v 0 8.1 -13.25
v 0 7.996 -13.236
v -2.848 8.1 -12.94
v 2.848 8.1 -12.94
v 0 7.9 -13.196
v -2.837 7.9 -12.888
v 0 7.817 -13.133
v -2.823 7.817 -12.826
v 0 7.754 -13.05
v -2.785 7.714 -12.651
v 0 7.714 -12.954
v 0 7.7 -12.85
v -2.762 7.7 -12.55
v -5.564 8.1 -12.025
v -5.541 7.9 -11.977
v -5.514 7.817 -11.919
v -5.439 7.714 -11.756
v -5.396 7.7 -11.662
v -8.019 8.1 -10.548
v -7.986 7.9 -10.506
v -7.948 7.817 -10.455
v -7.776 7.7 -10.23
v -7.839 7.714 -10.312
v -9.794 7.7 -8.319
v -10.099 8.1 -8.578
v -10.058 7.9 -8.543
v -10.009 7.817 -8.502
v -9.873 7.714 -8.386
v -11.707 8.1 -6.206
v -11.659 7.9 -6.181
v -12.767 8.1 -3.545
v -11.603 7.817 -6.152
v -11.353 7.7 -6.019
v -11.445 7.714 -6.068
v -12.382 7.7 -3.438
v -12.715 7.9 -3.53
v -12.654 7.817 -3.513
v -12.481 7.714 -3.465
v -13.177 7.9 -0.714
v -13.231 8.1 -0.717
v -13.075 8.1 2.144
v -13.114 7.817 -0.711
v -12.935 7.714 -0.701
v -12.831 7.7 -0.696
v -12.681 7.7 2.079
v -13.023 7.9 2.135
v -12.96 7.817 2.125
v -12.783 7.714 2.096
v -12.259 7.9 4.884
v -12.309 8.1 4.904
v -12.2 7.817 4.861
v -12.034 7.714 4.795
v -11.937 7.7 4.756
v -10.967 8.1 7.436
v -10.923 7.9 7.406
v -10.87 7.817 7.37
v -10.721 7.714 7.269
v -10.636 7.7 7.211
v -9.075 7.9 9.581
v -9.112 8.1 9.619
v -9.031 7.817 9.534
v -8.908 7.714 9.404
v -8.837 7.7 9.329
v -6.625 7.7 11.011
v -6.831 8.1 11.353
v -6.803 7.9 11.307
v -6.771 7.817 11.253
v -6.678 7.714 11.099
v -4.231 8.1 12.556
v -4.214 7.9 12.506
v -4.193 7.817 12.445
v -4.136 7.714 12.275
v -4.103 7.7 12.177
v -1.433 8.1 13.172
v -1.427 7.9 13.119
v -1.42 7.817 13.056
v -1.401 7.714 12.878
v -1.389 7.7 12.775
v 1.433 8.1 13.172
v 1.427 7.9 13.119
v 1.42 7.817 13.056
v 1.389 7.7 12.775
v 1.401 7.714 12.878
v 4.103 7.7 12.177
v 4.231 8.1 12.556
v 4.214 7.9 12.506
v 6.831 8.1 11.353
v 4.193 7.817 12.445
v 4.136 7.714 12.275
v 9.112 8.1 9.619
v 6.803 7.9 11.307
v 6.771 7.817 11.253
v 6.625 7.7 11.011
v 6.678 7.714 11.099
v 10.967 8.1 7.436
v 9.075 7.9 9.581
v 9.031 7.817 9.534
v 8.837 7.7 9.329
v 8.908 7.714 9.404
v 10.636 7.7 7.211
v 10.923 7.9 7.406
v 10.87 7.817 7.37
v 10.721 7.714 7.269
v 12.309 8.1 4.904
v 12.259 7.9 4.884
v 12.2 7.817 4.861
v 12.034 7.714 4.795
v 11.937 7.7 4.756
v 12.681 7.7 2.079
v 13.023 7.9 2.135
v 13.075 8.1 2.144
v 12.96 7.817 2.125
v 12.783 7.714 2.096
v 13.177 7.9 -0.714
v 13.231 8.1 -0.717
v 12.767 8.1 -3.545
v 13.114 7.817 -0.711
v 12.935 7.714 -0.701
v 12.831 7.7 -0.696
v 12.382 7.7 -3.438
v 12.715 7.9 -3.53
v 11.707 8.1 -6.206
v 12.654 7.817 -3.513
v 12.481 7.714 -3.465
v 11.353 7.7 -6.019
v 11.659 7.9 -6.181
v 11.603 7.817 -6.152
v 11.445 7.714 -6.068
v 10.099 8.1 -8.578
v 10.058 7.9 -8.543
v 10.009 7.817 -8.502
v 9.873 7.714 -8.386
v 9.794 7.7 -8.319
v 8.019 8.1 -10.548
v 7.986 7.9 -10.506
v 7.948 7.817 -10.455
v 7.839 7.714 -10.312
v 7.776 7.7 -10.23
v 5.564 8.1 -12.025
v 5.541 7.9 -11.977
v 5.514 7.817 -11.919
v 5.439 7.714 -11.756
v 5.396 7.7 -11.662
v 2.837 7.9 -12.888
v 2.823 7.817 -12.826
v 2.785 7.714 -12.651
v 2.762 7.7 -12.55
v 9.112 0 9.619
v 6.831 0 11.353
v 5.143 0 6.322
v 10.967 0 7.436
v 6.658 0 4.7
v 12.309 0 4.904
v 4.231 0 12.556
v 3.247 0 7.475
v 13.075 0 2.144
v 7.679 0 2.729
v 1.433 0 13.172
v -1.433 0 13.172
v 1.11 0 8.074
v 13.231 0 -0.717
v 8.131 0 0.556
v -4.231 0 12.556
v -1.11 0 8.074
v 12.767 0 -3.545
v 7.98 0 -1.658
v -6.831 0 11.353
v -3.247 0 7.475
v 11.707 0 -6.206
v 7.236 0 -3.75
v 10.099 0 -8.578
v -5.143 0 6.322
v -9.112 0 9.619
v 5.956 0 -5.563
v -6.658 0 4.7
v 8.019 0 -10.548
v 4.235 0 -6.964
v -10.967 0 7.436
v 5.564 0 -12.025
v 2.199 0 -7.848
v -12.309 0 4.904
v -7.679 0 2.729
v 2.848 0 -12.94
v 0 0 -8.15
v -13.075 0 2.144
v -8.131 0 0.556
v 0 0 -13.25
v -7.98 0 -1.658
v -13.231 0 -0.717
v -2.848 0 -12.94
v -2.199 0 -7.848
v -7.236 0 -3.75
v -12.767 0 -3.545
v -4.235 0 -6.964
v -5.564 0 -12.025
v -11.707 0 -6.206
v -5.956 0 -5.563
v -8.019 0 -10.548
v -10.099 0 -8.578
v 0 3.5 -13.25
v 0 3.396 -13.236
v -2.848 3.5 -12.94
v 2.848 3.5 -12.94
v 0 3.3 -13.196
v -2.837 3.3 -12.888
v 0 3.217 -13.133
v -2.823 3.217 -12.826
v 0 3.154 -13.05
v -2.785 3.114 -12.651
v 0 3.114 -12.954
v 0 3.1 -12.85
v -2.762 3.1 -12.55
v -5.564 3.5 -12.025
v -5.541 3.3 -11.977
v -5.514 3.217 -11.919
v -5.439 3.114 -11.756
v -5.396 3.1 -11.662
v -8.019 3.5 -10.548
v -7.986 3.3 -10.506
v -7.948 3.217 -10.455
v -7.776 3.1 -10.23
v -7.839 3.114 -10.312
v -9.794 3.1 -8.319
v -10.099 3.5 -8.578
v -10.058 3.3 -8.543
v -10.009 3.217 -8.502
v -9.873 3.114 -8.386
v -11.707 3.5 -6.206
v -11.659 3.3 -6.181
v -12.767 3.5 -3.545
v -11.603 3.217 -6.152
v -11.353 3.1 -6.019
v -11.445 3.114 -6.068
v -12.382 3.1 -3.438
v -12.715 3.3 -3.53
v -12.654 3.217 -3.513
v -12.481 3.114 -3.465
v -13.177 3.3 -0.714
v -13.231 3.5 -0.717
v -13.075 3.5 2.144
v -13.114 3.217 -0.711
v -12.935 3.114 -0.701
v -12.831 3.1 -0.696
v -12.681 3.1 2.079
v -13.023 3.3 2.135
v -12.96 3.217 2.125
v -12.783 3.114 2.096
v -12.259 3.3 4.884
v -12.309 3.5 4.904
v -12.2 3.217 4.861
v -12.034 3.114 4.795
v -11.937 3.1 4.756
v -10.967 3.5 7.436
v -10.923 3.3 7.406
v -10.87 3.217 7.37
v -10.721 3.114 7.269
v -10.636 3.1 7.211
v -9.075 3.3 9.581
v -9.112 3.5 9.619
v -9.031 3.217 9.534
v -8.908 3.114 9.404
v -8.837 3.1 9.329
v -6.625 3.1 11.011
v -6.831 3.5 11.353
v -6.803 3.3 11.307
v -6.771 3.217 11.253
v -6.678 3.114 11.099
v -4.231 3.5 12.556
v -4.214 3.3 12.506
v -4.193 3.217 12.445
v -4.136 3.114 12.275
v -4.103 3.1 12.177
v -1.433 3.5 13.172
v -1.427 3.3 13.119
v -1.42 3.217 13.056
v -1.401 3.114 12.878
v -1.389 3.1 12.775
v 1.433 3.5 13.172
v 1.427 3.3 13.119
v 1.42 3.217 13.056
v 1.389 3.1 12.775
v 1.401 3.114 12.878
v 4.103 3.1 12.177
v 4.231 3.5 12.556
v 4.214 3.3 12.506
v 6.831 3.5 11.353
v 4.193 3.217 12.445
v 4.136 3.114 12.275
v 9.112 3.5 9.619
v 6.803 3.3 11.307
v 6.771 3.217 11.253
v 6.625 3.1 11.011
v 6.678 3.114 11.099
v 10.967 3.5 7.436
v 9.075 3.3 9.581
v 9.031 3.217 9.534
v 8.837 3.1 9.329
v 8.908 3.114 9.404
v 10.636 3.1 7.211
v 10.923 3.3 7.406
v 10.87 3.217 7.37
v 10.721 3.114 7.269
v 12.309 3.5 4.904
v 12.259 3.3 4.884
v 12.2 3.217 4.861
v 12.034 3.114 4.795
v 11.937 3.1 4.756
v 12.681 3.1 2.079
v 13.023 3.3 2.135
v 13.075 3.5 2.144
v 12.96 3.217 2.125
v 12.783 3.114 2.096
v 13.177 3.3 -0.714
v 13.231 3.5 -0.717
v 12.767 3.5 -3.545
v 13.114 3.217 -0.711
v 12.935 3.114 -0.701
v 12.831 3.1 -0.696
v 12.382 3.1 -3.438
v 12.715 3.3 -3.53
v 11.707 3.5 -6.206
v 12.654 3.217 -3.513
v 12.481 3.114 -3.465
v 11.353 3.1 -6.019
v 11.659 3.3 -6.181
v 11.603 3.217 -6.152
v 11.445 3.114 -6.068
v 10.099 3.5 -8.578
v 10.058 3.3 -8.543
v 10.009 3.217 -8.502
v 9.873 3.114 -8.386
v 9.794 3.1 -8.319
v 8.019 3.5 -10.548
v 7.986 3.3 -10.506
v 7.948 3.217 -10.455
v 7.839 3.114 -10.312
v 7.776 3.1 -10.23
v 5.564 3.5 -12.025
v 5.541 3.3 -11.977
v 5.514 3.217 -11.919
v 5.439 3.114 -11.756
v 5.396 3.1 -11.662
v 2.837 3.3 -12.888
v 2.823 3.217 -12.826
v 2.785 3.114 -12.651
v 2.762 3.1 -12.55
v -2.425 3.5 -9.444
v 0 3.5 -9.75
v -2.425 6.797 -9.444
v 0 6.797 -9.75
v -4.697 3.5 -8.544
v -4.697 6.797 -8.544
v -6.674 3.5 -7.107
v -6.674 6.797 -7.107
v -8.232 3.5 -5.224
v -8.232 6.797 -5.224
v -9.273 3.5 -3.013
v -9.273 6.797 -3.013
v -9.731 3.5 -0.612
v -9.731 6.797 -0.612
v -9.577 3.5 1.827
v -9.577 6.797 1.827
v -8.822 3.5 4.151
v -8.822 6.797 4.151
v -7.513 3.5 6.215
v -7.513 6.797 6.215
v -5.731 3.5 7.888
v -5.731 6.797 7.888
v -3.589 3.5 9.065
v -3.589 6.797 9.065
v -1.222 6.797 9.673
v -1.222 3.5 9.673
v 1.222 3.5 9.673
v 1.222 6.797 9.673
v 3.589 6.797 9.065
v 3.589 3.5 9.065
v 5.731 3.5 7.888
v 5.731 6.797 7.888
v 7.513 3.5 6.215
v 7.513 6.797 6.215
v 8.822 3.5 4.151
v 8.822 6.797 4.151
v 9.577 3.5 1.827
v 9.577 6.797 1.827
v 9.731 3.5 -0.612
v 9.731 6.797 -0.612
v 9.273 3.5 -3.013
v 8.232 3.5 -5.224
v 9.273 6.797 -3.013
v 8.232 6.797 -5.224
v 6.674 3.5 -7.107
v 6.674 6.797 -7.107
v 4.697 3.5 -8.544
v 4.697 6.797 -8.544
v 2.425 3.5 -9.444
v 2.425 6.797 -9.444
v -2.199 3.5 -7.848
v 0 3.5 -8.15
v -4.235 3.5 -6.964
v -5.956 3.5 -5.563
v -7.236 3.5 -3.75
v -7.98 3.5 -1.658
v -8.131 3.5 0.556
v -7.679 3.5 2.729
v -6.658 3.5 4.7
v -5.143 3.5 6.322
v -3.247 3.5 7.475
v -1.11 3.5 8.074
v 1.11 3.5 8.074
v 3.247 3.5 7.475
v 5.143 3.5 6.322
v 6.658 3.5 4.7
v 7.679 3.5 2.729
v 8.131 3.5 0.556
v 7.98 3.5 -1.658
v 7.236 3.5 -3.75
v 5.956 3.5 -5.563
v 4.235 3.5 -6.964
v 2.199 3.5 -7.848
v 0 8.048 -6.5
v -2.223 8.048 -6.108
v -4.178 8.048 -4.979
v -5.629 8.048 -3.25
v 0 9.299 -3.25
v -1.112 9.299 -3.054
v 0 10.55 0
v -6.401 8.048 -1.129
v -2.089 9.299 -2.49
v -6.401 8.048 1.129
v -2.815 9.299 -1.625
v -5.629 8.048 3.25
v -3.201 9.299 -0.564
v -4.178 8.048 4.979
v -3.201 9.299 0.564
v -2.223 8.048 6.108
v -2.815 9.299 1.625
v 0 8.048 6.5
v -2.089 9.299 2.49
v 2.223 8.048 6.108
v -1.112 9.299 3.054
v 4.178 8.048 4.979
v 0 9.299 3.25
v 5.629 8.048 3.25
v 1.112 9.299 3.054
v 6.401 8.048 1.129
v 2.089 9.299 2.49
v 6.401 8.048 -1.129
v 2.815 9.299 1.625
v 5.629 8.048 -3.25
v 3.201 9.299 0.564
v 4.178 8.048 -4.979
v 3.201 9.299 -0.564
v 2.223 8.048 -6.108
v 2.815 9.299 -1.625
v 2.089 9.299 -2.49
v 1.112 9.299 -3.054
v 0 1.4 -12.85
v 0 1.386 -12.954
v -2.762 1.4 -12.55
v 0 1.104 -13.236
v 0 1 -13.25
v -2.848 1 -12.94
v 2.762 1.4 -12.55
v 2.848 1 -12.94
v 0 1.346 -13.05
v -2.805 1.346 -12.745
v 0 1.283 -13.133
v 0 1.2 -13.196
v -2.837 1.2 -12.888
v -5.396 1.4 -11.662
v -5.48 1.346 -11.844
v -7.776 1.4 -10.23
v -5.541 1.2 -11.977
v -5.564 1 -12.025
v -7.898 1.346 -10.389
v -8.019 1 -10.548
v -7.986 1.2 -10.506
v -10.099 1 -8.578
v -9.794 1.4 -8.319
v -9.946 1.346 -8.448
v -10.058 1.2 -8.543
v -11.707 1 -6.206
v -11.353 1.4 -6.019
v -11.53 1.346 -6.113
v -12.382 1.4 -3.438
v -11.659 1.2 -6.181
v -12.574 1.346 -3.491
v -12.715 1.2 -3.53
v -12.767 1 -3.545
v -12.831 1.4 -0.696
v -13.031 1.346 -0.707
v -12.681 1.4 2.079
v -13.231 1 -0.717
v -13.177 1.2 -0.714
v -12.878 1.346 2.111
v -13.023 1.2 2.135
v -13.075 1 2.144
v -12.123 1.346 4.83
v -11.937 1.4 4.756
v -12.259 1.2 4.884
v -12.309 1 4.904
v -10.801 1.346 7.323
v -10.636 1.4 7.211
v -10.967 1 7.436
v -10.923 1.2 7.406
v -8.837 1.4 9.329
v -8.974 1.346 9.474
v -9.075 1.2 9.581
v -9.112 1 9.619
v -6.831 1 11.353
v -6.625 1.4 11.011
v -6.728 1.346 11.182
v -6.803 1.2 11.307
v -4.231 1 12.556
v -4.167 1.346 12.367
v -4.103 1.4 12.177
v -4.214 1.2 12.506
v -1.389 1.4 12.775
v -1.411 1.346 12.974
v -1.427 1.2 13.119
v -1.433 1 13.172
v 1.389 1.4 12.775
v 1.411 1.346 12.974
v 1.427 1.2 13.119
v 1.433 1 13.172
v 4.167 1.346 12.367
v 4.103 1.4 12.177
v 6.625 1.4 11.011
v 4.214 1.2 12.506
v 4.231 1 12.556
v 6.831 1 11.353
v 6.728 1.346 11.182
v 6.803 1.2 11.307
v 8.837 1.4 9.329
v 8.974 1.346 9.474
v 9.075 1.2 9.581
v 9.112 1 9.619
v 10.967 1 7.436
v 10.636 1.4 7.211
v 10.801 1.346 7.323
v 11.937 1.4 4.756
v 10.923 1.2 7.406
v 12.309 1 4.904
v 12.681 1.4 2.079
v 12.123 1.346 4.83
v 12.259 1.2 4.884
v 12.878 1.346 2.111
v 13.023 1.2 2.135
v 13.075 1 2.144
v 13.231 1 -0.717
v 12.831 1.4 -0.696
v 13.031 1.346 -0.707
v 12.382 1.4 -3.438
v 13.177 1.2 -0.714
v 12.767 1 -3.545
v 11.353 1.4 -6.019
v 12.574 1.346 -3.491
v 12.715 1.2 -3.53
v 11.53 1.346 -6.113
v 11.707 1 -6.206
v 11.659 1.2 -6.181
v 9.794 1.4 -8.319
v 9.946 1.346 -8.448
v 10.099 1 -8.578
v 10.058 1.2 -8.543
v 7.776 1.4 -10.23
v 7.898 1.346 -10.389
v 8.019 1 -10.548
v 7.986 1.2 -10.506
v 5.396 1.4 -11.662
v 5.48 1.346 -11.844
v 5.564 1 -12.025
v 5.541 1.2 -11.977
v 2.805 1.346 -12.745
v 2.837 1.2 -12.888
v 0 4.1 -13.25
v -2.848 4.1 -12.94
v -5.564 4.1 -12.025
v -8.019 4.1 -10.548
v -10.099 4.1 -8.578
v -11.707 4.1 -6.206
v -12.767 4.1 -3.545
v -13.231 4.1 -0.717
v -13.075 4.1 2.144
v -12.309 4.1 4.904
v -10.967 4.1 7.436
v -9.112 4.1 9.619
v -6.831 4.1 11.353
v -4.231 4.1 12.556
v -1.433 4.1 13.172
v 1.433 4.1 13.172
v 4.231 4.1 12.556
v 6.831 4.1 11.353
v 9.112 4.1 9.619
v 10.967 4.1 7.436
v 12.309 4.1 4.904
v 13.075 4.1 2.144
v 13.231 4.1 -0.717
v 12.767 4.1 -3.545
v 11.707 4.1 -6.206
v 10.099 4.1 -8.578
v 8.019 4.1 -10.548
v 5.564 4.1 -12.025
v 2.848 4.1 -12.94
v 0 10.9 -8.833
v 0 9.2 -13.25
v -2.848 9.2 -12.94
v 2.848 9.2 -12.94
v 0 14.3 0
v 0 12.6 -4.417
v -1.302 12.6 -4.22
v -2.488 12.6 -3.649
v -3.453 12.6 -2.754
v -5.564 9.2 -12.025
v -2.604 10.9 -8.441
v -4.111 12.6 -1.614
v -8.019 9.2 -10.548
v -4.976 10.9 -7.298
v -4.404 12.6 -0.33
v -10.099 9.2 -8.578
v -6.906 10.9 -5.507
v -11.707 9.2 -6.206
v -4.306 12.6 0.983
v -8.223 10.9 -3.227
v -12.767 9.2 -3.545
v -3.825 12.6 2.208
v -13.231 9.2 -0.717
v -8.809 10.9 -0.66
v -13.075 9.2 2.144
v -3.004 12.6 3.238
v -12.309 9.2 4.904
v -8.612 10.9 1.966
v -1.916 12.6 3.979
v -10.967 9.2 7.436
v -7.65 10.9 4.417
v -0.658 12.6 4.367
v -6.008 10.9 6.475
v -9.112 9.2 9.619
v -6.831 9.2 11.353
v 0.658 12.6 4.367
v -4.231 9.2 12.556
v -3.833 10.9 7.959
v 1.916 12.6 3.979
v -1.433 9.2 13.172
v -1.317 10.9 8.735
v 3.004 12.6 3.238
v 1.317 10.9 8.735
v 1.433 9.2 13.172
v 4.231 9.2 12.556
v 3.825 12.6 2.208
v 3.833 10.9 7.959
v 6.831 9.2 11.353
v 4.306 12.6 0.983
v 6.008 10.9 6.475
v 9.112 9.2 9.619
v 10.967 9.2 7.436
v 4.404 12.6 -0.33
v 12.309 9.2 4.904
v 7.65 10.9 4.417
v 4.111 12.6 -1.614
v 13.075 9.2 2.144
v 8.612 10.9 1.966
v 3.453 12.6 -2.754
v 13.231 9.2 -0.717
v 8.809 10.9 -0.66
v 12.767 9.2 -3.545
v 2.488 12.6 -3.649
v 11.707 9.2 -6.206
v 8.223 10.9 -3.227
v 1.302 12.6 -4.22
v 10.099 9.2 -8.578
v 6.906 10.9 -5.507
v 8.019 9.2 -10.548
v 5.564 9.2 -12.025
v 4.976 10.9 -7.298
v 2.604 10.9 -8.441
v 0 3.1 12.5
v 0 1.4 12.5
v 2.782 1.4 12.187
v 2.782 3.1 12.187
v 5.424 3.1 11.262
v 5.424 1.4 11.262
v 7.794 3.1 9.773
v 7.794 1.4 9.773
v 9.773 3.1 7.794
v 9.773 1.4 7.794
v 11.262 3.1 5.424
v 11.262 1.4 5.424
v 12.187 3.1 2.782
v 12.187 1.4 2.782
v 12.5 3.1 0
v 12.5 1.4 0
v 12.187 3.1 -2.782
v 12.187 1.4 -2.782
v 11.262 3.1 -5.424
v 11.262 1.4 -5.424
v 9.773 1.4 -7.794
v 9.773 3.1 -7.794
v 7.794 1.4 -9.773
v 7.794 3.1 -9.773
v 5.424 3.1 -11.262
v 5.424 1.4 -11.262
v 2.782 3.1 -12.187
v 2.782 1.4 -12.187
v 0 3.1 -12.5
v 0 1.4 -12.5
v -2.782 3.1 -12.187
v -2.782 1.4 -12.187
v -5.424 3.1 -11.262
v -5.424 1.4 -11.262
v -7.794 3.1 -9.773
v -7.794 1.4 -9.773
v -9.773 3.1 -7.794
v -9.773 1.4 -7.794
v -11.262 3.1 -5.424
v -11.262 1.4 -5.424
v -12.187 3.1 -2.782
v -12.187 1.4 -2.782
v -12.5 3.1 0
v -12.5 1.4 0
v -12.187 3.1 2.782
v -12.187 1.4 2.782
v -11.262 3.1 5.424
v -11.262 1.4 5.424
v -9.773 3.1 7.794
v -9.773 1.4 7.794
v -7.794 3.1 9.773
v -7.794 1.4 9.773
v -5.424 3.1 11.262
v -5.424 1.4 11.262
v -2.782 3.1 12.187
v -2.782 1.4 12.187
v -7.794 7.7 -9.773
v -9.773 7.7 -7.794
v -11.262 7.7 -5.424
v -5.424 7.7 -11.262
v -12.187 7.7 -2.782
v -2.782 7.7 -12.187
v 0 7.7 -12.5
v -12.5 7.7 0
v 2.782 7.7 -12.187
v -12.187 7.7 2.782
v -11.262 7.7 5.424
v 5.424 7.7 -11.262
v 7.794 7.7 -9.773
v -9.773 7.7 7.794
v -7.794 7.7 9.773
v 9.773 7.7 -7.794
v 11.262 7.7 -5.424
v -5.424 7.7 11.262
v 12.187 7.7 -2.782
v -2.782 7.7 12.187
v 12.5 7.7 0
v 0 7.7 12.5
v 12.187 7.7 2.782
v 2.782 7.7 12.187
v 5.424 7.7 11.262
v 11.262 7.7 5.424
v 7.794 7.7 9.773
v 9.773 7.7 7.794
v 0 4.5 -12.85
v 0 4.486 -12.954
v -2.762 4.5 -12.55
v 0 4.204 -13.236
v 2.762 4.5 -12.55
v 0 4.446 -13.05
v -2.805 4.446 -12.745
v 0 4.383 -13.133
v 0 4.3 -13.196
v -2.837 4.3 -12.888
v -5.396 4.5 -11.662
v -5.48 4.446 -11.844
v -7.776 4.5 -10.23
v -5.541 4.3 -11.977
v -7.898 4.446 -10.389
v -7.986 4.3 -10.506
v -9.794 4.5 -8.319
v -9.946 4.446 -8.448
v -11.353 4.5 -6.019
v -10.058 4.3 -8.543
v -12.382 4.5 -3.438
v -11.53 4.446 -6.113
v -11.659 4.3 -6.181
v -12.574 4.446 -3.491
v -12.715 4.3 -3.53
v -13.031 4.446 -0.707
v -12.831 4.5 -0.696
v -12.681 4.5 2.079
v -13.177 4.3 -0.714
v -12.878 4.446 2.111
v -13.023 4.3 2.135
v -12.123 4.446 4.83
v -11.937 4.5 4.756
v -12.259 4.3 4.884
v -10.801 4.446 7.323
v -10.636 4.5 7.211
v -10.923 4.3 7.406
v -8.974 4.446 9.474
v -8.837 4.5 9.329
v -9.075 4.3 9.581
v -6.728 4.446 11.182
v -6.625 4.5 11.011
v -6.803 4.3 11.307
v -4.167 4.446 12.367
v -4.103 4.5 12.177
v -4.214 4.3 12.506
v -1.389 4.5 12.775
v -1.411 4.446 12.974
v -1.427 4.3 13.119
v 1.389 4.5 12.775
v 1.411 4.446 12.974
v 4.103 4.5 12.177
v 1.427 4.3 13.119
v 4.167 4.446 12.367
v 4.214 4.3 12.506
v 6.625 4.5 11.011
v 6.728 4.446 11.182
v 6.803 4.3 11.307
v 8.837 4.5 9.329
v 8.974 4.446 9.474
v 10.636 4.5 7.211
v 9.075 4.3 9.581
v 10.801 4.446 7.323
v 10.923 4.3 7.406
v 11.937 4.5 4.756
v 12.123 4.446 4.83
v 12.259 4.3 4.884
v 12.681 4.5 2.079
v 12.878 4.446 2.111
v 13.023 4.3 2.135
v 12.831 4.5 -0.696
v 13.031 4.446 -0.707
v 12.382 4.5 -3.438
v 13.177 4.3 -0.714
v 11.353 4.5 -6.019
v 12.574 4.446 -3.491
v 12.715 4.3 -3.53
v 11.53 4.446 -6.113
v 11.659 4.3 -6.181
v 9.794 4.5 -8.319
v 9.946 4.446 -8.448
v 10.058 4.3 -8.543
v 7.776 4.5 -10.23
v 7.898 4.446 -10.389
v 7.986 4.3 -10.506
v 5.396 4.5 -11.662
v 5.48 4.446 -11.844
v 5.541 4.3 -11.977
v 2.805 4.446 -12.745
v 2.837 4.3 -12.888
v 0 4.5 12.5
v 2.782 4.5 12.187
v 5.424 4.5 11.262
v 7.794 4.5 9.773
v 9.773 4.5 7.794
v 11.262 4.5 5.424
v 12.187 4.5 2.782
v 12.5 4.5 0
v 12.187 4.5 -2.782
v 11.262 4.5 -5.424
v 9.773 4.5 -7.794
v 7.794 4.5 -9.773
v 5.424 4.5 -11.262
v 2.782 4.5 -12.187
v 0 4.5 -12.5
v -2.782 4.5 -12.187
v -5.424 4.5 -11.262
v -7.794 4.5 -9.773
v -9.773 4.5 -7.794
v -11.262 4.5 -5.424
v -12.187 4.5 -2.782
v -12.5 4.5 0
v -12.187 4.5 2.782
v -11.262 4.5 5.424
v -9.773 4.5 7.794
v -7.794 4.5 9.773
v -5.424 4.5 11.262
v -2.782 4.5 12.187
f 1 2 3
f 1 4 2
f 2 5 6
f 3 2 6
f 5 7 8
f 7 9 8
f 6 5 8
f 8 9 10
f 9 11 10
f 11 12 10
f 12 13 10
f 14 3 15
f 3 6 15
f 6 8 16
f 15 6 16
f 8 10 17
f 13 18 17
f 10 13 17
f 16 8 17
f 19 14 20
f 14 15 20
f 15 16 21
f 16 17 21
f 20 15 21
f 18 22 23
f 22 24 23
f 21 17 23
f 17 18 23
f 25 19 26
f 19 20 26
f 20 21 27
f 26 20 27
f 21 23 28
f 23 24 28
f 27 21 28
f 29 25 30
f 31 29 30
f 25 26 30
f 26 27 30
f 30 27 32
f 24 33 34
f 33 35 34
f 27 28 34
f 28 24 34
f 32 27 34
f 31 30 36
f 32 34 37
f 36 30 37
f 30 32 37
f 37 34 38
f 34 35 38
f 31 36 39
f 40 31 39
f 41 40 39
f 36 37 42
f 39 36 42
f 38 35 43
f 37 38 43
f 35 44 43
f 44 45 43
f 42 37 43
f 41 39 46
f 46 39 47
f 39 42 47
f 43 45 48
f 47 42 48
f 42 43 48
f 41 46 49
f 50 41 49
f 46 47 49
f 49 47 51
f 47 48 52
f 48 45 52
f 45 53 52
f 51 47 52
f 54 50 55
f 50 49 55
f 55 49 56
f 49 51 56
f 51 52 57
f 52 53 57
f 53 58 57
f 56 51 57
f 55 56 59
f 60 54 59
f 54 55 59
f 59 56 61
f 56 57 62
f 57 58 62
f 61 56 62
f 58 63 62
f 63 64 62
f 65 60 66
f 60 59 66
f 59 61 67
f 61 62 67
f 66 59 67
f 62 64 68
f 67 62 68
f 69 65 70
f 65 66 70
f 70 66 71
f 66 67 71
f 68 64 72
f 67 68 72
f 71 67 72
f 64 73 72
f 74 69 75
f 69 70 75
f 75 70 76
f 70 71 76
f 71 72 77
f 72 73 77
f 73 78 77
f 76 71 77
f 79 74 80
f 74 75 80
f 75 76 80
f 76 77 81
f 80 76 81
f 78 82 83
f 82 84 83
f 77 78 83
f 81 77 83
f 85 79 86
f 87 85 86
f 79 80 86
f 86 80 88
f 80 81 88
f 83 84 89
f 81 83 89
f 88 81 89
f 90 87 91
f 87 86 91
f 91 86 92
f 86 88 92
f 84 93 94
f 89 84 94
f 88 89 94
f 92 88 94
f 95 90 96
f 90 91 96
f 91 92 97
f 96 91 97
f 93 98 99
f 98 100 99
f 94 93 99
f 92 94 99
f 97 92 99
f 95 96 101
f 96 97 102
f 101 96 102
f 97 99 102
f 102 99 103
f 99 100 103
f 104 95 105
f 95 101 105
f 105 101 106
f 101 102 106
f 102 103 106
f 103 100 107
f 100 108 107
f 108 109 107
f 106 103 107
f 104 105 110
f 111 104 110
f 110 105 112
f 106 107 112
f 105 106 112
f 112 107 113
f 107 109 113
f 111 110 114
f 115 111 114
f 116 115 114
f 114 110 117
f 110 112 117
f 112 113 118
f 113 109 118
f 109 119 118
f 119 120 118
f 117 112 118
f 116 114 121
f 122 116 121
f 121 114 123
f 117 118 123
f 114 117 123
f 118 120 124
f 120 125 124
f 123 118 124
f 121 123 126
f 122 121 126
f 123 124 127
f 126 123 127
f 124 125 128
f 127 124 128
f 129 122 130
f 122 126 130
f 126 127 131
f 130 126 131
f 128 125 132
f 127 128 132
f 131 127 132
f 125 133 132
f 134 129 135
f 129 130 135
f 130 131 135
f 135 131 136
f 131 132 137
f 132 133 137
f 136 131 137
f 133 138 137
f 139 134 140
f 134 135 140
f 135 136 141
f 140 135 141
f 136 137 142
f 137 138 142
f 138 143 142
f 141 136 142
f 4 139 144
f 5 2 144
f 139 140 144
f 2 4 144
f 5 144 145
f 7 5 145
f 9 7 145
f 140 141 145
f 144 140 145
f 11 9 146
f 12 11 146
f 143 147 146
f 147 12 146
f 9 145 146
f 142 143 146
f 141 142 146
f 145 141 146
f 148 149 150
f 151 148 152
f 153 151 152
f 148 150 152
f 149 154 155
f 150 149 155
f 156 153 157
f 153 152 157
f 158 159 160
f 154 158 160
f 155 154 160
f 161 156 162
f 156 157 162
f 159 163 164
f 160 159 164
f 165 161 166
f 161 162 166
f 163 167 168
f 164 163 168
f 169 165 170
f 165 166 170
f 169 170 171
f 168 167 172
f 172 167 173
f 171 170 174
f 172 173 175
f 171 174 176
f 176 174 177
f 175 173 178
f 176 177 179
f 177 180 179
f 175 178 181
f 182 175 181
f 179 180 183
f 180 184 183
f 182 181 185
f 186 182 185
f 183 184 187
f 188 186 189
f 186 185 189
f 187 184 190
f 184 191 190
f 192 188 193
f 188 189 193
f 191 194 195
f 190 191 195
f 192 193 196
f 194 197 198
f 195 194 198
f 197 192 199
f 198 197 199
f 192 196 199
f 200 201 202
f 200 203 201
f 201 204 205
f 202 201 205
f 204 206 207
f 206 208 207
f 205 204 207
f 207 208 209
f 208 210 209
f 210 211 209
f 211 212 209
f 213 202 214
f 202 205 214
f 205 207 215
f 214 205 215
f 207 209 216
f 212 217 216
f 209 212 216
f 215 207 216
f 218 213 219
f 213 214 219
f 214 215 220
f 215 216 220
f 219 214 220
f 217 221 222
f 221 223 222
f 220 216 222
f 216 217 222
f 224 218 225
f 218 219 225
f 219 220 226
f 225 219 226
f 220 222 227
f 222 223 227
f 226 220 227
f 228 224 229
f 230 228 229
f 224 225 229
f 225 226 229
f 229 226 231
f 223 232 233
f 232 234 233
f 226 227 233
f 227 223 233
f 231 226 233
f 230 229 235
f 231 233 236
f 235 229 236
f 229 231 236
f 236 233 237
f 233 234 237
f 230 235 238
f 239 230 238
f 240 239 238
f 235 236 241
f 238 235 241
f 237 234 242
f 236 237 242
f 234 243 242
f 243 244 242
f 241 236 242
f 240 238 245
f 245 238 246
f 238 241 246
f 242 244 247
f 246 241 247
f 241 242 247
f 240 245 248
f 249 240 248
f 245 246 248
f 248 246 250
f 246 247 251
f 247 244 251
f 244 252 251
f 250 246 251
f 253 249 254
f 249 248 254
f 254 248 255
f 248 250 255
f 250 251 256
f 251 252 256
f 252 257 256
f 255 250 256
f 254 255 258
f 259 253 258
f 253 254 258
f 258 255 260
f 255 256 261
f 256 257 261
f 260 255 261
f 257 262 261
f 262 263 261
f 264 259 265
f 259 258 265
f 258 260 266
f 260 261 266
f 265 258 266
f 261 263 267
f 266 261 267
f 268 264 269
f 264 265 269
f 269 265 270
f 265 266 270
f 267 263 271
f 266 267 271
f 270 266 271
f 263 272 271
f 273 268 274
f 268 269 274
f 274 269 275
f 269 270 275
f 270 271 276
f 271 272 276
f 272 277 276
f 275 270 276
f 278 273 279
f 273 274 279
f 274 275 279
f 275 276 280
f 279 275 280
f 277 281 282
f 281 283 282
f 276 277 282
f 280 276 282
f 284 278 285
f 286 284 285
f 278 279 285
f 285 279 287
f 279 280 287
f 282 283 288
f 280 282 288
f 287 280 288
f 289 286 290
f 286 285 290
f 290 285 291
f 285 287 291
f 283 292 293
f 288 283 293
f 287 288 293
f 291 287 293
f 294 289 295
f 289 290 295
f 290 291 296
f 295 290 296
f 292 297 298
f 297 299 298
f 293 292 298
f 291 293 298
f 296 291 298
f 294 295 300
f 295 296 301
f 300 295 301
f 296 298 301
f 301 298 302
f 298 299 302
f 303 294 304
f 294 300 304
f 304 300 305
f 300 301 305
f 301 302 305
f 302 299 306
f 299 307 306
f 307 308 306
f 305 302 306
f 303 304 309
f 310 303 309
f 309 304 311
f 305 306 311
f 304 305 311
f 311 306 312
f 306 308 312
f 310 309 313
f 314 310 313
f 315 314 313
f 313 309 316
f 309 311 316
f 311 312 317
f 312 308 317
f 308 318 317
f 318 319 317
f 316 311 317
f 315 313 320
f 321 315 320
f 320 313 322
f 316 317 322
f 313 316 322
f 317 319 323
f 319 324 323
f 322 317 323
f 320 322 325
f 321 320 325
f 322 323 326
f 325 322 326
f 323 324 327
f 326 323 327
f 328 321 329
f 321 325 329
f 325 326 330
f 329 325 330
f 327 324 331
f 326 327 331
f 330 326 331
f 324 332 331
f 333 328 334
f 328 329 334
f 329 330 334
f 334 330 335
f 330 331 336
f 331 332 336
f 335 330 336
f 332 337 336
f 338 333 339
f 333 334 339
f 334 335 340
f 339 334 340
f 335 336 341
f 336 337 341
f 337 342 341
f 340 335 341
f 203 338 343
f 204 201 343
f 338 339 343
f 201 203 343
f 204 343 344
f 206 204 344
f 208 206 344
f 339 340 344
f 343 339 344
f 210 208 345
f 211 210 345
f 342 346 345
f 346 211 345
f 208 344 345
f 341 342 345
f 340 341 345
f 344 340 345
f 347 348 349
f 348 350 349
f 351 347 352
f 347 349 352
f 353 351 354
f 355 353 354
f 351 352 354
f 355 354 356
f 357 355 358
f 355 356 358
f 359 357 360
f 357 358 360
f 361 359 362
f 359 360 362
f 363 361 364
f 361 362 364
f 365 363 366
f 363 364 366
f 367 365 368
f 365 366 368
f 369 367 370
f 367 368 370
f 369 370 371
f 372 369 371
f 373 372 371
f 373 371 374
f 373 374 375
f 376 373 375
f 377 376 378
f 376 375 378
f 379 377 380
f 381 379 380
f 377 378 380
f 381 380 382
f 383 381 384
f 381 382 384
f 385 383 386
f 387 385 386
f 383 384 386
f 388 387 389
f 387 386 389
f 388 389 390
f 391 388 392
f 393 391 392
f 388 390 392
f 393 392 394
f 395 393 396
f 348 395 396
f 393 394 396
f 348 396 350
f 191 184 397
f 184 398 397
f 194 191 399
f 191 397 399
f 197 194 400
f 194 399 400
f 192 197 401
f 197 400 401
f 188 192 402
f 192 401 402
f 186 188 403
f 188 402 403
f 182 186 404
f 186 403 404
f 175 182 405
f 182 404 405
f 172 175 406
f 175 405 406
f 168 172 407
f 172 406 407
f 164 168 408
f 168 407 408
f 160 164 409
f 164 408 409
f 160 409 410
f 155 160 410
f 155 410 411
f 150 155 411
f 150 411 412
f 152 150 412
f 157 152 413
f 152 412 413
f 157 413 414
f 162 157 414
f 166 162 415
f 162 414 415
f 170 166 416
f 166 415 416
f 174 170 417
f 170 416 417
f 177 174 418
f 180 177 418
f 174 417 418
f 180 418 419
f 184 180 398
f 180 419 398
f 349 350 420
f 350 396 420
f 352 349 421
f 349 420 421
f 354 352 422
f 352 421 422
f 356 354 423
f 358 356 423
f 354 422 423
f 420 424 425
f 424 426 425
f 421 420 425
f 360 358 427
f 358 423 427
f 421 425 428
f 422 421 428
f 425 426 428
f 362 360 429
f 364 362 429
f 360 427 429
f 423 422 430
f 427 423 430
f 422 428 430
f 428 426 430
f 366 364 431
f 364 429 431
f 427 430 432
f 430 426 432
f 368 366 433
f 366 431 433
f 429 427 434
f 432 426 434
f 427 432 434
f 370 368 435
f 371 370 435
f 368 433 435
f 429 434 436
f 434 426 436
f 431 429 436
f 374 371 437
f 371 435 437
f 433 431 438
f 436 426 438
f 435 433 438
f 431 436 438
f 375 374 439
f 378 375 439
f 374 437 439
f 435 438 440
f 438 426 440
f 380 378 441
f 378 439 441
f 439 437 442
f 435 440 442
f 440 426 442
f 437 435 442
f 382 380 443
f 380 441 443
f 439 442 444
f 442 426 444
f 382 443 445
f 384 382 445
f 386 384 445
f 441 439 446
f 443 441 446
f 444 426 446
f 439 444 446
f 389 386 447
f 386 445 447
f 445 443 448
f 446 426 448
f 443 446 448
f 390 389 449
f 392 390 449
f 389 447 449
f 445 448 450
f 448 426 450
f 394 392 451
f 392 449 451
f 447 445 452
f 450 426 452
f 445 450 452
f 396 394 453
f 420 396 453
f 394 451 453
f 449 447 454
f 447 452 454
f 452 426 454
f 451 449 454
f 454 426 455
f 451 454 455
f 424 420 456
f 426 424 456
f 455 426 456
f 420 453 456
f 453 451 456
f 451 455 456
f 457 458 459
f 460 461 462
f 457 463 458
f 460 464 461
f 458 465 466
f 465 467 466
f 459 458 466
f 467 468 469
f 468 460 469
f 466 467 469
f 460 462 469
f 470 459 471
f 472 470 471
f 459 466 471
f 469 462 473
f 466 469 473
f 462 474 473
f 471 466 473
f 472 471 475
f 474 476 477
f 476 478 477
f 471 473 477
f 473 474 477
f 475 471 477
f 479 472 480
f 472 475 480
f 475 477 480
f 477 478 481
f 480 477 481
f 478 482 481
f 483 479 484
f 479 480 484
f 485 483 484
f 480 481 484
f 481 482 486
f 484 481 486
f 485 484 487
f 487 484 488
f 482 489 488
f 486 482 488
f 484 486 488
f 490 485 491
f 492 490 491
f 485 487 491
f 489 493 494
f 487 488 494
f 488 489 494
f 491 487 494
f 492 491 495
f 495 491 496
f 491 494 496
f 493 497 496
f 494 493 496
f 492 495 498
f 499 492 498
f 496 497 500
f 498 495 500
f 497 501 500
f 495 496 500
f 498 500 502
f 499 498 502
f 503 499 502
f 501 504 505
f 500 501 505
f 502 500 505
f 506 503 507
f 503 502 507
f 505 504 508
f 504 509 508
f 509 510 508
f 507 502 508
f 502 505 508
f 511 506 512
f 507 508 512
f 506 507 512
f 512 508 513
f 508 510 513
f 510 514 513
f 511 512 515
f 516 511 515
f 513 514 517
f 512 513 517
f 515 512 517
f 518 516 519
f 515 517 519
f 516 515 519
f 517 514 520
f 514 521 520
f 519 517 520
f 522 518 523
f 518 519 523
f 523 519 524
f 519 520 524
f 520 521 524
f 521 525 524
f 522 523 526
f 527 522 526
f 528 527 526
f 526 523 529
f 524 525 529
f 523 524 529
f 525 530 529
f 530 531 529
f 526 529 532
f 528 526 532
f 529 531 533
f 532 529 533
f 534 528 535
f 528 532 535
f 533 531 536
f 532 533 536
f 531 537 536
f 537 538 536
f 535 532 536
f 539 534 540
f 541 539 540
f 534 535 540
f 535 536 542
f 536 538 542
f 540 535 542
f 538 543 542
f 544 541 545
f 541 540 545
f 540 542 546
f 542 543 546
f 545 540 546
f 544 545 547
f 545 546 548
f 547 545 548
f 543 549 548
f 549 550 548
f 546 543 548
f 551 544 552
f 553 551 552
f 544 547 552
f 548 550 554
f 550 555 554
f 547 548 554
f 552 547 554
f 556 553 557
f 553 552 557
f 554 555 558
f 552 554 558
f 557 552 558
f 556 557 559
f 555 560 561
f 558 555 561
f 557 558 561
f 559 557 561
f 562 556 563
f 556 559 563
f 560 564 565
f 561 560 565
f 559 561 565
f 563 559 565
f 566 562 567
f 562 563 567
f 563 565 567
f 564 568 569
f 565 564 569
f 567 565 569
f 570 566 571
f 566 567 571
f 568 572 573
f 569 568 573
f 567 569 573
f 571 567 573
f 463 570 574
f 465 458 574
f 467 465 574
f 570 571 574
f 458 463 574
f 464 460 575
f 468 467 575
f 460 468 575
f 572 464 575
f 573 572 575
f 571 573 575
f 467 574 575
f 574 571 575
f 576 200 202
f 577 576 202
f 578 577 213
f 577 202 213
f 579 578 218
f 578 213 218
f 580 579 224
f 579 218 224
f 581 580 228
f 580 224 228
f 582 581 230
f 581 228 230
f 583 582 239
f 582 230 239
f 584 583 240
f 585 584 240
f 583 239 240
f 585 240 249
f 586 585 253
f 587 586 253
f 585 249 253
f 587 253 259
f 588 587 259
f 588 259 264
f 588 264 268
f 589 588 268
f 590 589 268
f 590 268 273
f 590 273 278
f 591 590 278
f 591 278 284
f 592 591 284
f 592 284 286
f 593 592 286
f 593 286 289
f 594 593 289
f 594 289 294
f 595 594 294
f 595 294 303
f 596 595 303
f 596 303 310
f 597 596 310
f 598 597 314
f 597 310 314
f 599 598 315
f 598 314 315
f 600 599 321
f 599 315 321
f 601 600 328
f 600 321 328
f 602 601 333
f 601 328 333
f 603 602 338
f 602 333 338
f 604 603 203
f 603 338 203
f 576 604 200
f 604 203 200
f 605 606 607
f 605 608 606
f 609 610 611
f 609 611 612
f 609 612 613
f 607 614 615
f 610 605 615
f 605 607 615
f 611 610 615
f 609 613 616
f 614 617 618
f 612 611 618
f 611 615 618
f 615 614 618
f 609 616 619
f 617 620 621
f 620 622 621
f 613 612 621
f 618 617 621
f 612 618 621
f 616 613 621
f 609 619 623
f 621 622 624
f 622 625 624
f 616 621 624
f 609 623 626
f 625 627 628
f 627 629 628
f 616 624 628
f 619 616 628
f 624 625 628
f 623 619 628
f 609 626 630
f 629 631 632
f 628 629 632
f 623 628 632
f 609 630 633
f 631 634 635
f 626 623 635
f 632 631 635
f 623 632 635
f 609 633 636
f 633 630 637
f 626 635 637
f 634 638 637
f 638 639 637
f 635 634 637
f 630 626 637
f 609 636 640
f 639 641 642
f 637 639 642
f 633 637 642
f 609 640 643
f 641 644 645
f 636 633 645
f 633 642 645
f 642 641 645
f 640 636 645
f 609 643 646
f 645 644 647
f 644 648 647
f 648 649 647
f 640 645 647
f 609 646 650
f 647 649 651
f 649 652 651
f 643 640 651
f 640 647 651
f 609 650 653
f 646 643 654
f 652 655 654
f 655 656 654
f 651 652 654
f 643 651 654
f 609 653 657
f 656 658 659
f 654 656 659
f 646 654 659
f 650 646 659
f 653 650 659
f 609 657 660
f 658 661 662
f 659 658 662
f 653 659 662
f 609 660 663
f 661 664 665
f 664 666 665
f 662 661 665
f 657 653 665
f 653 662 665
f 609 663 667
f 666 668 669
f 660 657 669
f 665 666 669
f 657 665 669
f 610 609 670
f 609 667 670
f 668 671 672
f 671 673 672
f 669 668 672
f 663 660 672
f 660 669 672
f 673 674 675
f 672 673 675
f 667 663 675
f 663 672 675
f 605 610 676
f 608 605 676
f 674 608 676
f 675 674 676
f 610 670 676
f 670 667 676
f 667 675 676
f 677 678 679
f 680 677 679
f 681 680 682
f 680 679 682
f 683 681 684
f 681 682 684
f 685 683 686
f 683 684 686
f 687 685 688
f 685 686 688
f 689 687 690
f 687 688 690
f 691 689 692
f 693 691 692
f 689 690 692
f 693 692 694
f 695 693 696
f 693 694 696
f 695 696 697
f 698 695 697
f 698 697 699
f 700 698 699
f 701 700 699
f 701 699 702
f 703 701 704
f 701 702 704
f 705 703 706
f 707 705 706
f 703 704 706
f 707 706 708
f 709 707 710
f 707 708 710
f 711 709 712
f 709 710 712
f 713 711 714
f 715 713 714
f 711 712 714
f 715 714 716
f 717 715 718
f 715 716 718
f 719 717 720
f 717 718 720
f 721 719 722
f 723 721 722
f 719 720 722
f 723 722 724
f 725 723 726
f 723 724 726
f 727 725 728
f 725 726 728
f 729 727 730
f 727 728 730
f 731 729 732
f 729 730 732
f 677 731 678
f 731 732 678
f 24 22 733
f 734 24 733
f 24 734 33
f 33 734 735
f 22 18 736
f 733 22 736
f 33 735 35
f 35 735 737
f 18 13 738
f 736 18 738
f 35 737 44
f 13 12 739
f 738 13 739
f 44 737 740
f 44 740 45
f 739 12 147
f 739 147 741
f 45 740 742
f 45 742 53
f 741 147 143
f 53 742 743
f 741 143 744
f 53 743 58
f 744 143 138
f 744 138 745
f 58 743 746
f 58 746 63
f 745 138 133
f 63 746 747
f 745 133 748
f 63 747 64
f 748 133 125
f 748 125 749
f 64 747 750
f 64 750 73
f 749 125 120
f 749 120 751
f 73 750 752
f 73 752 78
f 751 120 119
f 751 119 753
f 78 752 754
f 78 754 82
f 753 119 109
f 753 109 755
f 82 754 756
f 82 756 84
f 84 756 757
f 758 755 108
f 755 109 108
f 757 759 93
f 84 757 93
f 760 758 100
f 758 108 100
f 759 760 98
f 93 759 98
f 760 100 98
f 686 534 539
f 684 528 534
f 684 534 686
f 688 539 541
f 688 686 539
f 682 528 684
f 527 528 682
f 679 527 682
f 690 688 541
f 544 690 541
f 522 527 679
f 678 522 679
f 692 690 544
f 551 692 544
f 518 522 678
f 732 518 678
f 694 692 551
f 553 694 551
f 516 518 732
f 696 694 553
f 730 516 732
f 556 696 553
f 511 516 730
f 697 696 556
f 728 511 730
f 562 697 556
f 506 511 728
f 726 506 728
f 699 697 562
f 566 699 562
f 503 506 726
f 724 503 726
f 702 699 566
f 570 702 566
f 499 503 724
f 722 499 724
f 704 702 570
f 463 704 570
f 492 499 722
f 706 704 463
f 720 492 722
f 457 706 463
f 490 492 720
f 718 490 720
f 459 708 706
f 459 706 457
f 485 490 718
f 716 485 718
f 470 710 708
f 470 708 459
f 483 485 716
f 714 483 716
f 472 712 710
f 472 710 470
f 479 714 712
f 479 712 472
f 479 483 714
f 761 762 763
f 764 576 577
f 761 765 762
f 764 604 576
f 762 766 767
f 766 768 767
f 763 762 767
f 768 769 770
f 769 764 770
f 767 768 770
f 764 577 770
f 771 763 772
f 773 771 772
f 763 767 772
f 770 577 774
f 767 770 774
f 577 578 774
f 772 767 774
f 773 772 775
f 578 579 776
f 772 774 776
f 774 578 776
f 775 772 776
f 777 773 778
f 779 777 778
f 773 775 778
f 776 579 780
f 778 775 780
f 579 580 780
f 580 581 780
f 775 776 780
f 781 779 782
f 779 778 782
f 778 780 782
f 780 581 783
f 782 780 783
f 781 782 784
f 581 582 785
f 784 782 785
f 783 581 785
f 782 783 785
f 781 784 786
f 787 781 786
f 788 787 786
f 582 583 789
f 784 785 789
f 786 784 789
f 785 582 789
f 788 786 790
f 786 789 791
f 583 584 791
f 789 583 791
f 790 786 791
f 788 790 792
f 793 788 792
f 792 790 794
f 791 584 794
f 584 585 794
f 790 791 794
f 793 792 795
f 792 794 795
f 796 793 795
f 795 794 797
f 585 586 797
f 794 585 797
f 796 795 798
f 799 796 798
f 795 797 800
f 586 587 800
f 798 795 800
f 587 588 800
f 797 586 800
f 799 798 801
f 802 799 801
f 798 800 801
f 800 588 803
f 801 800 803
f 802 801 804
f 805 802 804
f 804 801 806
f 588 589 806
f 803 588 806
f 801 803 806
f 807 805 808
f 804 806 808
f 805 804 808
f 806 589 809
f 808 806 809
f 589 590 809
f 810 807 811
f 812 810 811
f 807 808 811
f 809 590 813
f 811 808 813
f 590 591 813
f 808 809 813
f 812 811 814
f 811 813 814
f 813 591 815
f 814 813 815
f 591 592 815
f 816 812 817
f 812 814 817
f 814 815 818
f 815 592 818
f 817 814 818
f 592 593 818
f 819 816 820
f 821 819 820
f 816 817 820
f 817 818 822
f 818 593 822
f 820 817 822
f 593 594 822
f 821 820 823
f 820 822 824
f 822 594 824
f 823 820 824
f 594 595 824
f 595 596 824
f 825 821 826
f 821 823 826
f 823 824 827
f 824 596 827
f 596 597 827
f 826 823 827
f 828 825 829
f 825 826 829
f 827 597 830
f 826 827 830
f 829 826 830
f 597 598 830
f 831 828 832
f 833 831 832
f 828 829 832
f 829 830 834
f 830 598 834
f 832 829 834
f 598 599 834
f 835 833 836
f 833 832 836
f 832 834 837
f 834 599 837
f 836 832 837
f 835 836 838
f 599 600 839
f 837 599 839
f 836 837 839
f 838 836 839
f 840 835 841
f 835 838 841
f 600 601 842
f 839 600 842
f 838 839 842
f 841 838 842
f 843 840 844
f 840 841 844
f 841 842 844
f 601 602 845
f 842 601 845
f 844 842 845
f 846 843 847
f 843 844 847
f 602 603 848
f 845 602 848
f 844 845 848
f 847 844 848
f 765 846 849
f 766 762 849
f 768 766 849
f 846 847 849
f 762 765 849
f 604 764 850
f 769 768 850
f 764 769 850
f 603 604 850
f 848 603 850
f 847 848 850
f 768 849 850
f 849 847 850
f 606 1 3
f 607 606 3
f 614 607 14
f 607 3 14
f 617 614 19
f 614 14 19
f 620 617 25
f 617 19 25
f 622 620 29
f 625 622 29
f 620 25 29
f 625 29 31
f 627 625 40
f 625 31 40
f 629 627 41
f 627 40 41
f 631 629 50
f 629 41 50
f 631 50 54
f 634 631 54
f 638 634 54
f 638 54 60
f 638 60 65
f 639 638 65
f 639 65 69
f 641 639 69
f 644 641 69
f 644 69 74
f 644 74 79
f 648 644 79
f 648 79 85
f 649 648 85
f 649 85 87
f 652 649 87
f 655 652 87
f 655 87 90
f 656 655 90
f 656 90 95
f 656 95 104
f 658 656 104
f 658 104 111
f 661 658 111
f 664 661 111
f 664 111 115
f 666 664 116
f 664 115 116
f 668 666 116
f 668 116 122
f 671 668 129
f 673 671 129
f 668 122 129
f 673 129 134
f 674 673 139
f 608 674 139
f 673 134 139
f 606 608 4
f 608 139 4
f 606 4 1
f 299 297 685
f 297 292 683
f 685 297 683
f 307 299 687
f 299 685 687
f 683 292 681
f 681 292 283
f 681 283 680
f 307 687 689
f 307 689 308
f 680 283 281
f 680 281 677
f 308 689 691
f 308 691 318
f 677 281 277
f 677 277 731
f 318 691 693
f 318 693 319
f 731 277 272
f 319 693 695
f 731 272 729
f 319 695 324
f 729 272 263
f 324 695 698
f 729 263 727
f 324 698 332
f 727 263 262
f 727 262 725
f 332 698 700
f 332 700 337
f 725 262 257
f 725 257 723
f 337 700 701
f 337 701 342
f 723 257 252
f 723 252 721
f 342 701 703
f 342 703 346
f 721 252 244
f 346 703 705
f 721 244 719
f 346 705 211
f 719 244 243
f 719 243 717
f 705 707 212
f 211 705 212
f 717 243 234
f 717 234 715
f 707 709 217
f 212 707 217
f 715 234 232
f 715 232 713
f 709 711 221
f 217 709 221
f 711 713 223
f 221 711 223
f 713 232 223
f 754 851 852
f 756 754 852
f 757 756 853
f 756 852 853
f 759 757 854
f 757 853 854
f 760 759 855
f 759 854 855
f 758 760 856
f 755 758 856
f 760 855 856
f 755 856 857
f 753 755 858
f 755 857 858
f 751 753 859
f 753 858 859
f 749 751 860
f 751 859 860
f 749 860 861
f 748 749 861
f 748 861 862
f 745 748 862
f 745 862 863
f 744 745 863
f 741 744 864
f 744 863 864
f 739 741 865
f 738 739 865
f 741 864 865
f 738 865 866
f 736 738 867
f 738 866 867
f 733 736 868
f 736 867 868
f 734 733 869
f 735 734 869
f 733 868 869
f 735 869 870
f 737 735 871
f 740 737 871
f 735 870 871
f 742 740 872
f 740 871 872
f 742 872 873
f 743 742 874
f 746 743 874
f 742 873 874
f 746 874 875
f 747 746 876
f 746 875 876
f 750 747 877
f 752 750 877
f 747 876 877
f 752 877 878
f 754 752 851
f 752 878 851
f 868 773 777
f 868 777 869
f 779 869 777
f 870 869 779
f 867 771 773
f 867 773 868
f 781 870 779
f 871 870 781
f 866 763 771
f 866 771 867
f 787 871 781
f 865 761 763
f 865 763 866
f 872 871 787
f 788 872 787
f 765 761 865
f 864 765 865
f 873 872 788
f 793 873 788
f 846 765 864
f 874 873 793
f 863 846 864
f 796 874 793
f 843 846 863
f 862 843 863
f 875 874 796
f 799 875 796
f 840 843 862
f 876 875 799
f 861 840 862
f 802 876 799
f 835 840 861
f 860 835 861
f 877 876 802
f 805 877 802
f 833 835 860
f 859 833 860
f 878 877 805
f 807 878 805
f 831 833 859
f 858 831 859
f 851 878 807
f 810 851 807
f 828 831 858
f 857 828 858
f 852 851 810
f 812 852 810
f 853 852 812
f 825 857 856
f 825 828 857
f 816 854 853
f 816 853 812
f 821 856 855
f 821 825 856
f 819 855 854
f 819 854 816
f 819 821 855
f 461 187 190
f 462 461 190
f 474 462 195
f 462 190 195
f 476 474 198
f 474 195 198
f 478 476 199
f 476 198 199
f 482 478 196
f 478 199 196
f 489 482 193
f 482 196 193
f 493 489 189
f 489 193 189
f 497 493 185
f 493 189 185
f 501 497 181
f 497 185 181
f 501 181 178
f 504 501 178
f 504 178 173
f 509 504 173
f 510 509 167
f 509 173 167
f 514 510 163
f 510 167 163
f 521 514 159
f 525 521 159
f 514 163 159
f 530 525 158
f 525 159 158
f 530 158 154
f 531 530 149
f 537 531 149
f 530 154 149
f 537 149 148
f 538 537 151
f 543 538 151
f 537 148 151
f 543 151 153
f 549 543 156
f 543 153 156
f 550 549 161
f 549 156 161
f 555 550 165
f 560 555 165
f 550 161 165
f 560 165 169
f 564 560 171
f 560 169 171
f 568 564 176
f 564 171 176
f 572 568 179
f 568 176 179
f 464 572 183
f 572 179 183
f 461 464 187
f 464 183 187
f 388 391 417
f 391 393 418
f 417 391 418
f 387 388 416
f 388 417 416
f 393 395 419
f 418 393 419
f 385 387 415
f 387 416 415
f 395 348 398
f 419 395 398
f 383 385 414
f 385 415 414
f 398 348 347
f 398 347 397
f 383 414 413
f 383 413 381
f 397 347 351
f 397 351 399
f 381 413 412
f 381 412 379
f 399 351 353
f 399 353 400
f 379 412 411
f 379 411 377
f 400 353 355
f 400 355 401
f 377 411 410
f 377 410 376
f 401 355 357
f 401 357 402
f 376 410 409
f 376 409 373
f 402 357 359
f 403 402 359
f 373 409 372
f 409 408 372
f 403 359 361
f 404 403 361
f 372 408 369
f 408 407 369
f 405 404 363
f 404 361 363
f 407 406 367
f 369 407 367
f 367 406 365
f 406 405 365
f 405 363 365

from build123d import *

# Parameters (mm, degrees)
SKETCH3_R          = 13.25
SKETCH3_R_2        = 12.5
CUT_EXTRUDE1_DEPTH = 1.7
SKETCH4_R          = 13.25
SKETCH4_R_2        = 12.5
CUT_EXTRUDE2_DEPTH = 3.2
FILLET1_R          = 0.4


with BuildPart() as part:
    # Sketch2 → Revolve1 (revolve)
    with BuildSketch(Plane(origin=(0, 0, 0), x_dir=(0, 0, -1), z_dir=(1, 0, 0))):
        Polygon((0, 14.3), (13.25, 9.2), (13.25, 0), (8.15, 0), (8.15, 3.5), (9.75, 3.5), (9.75, 6.796854291), (0, 10.54968448), align=None)
    revolve(axis=Axis((0, -0.715, 0), (0, 1, 0)))

    # Sketch3 → Cut-Extrude1 (cut)
    with BuildSketch(Plane(origin=(0, 1.4, 0), x_dir=(1, 0, 0), z_dir=(0, 1, 0))):
        with Locations(Location((0, 0, 0), (0, 0, 90))):
            Circle(SKETCH3_R)
        with Locations(Location((0, 0, 0), (0, 0, 270))):
            Circle(SKETCH3_R_2, mode=Mode.SUBTRACT)
    extrude(amount=CUT_EXTRUDE1_DEPTH, mode=Mode.SUBTRACT)

    # Sketch4 → Cut-Extrude2 (cut)
    with BuildSketch(Plane(origin=(0, 4.5, 0), x_dir=(1, 0, 0), z_dir=(0, 1, 0))):
        with Locations(Location((0, 0, 0), (0, 0, 270))):
            Circle(SKETCH4_R)
        with Locations(Location((0, 0, 0), (0, 0, 270))):
            Circle(SKETCH4_R_2, mode=Mode.SUBTRACT)
    extrude(amount=CUT_EXTRUDE2_DEPTH, mode=Mode.SUBTRACT)

    # Fillet1
    fillet1_edges = [part.edges().sort_by_distance(p)[0] for p in [
        (0, 3.1, 13.25),
        (0, 1.4, 13.25),
        (0, 7.7, 13.25),
        (0, 4.5, 13.25),
    ]]
    fillet(fillet1_edges, radius=FILLET1_R)


solid = part.part
